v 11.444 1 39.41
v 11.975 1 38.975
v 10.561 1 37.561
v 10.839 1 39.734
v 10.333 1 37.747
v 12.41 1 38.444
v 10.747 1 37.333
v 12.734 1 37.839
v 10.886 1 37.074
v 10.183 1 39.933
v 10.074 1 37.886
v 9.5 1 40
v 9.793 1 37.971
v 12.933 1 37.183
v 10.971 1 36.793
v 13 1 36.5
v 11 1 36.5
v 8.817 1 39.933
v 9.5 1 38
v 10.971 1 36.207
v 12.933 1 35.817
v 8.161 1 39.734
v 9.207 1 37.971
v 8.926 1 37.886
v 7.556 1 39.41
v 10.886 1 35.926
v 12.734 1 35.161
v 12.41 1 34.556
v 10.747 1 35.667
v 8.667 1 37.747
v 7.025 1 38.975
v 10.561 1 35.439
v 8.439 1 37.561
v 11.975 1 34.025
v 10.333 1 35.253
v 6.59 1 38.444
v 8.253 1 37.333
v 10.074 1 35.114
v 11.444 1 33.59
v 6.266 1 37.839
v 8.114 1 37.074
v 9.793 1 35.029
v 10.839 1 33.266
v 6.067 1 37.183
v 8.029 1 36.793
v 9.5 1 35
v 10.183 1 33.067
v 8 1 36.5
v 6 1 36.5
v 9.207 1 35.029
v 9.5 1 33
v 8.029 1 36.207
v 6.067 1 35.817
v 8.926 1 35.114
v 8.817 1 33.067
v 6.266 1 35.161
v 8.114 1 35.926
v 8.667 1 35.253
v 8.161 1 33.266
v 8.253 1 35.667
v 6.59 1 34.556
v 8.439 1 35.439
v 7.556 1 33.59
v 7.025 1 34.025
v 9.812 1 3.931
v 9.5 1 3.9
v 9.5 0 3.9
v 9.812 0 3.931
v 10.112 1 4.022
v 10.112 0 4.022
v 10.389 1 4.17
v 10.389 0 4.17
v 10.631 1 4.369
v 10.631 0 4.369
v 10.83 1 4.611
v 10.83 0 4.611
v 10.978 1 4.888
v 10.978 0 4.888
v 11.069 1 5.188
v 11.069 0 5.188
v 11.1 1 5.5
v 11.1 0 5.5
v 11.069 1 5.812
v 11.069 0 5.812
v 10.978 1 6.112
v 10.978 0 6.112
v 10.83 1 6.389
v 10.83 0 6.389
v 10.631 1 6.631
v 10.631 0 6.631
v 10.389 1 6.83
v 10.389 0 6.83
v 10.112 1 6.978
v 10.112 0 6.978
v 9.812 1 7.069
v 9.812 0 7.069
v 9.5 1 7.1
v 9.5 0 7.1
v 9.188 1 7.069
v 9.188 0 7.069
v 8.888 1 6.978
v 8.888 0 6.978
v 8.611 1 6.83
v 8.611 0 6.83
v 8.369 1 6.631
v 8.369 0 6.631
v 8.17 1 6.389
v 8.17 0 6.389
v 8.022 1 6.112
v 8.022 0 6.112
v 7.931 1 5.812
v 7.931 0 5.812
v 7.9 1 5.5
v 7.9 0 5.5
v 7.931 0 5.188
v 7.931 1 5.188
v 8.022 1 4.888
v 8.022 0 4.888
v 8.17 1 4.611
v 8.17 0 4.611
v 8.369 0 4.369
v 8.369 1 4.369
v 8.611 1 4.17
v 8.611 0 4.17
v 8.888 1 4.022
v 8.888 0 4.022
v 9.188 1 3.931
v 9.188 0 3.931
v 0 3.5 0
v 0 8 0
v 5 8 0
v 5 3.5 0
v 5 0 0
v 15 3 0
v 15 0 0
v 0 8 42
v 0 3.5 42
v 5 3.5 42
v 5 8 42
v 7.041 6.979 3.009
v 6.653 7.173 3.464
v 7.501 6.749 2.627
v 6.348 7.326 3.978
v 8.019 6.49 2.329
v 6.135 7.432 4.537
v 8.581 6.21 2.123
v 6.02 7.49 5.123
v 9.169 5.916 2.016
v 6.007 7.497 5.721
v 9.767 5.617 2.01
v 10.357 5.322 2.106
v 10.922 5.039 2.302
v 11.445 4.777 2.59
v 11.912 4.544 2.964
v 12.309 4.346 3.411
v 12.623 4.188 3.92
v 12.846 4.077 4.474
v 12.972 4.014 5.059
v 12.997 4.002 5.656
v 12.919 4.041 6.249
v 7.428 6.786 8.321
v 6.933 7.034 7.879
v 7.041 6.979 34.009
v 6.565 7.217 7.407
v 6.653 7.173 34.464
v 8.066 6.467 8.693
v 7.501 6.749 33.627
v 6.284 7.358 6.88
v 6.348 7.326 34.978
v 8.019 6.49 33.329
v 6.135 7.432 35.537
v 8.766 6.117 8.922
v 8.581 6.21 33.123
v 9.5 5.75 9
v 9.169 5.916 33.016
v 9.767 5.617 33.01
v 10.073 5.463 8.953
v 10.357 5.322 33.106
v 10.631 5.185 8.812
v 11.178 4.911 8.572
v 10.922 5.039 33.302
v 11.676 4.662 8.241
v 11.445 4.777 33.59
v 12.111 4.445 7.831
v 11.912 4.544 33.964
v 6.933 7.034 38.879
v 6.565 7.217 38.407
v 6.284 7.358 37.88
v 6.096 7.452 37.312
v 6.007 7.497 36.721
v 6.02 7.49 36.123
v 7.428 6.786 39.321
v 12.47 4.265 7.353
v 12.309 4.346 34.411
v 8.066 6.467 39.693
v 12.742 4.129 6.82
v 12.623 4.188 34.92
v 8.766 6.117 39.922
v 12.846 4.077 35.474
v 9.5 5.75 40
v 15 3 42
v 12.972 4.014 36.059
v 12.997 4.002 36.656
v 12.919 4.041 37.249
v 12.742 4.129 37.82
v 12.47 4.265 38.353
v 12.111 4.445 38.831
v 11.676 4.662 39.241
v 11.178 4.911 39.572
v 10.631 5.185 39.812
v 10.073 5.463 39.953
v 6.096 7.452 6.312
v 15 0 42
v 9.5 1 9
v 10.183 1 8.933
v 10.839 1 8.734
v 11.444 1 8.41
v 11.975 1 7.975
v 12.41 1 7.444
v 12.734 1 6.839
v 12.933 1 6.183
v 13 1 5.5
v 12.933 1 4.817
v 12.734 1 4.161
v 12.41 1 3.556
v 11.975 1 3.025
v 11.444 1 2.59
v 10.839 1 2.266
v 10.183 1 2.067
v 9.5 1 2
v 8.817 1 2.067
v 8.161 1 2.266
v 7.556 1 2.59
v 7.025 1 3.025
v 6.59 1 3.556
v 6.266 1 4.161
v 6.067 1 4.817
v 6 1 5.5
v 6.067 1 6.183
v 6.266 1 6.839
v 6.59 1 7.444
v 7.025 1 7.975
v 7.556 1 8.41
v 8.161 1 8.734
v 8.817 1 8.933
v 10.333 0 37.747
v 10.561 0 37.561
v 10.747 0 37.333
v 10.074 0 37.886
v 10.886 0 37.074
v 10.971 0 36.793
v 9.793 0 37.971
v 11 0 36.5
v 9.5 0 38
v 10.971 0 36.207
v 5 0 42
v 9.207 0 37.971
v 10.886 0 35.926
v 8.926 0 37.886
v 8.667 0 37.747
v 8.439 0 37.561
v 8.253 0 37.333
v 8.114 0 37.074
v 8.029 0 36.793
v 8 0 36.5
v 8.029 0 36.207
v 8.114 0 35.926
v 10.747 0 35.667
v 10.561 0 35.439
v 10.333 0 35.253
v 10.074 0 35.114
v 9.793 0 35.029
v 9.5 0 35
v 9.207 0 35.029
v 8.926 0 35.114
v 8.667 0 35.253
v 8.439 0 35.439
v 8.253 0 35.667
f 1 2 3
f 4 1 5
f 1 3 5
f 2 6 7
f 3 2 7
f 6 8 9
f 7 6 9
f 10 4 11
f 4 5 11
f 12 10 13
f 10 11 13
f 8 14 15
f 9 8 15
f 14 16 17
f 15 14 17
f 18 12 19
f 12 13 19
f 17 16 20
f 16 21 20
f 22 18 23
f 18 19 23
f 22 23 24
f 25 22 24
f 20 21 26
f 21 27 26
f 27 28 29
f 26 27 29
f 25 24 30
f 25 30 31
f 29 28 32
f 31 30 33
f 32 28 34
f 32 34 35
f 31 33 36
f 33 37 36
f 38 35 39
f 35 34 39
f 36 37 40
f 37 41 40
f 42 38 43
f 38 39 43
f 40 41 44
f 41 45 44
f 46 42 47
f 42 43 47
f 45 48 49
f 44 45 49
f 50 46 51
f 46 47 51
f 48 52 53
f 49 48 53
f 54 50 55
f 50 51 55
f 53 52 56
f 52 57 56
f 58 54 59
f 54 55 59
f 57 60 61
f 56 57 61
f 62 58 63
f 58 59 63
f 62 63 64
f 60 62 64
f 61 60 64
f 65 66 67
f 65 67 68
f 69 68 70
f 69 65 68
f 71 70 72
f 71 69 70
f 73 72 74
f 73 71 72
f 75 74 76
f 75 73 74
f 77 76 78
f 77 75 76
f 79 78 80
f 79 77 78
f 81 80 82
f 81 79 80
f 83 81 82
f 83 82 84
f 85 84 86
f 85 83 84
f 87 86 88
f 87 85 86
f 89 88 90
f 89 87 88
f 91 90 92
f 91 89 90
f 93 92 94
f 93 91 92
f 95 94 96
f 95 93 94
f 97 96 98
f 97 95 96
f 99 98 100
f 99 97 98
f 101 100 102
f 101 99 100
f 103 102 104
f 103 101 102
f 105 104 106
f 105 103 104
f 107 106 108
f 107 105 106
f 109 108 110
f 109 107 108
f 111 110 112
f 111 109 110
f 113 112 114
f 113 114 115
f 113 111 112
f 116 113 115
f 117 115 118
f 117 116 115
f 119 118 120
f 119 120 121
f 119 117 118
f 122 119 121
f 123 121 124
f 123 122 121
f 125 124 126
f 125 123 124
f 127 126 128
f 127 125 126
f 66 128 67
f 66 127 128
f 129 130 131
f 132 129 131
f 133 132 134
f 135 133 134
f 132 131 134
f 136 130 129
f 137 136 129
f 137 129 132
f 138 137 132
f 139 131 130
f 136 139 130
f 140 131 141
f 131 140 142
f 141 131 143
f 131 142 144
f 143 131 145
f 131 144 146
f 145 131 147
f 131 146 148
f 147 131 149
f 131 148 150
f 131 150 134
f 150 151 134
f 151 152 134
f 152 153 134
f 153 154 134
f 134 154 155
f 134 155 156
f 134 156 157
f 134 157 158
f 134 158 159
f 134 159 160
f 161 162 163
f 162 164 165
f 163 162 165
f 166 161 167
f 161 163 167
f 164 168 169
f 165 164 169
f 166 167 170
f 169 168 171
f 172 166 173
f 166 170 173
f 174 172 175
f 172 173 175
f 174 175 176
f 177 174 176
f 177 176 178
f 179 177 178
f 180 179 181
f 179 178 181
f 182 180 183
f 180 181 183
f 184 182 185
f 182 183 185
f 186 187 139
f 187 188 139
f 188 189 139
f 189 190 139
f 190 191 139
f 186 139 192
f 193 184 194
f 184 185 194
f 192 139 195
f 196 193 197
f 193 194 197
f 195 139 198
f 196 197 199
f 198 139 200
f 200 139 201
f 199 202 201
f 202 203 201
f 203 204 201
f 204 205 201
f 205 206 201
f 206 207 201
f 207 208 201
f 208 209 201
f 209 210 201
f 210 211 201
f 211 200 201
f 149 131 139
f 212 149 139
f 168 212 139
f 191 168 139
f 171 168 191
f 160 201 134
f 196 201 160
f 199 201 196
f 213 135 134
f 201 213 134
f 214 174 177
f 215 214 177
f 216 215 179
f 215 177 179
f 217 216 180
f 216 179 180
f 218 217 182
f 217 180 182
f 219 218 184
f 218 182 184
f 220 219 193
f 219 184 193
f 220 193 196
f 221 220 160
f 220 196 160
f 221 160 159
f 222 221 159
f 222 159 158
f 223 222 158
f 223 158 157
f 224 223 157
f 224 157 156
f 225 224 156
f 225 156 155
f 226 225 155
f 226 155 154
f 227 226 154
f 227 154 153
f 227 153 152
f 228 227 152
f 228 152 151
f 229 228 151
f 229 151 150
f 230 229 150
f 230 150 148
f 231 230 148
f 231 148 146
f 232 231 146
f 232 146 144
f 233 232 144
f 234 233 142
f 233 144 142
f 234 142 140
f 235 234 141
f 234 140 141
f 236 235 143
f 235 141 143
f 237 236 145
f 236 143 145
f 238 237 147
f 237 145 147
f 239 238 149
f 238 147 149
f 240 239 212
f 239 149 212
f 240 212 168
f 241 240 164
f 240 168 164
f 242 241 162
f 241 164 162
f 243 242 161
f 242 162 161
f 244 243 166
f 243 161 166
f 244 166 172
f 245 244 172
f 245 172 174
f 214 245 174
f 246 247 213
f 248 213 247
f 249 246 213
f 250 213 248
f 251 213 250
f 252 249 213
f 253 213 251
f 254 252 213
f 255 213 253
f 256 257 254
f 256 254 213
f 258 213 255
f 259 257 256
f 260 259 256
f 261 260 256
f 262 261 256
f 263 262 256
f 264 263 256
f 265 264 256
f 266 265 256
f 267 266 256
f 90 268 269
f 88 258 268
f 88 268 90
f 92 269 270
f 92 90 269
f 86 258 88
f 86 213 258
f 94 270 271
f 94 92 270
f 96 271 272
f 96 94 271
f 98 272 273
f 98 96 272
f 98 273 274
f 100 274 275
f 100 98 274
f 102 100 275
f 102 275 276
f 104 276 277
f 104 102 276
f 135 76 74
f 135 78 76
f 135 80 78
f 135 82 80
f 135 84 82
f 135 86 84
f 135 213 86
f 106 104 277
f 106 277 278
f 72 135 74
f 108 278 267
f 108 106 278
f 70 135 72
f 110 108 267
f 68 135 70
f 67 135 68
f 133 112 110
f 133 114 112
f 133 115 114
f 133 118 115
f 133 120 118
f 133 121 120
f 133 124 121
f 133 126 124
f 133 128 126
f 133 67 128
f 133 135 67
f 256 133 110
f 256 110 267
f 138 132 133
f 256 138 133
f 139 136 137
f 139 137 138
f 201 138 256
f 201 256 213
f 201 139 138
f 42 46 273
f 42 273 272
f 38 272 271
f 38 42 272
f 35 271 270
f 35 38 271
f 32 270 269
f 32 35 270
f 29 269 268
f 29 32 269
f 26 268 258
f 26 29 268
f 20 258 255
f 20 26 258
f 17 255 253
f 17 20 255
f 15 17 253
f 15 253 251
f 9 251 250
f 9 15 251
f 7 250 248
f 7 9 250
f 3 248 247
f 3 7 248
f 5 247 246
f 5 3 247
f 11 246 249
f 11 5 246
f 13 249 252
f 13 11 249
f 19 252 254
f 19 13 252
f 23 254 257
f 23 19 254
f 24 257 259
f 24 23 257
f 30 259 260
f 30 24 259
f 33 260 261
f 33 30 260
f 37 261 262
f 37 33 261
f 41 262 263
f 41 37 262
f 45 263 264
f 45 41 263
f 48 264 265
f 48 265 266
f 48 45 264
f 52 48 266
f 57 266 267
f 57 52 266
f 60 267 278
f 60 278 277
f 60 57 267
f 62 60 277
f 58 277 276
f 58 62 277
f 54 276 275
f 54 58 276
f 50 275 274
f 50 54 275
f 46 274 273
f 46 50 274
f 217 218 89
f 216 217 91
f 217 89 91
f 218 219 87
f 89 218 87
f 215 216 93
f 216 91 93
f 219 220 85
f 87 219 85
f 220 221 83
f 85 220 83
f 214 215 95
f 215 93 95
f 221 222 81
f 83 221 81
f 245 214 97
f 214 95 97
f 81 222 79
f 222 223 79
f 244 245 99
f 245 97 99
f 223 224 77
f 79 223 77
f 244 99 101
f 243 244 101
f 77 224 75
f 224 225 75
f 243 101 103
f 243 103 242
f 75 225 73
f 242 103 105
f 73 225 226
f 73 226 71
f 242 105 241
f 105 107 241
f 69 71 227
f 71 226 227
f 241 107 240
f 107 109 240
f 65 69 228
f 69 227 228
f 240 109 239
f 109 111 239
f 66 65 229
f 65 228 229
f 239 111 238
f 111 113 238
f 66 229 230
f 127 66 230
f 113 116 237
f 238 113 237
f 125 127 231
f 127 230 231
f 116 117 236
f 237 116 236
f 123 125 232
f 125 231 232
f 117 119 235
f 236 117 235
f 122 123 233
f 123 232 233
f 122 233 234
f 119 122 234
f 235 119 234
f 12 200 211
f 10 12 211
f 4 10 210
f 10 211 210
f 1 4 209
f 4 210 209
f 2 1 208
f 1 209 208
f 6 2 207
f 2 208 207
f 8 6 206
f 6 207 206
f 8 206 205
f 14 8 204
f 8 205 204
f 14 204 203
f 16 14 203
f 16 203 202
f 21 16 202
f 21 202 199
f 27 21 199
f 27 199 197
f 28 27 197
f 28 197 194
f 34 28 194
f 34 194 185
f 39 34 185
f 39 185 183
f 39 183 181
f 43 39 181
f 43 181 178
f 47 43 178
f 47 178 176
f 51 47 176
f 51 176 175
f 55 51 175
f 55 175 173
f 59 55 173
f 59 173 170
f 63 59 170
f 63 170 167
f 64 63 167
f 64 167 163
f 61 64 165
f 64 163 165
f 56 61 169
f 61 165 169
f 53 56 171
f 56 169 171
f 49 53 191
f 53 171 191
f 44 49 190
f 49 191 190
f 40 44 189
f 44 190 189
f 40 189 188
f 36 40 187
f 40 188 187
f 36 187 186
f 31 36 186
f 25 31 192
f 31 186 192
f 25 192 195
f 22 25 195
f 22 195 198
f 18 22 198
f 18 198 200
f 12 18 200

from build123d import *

# Parameters (mm, degrees)
BOSS_EXTRU_1_DEPTH      = 42
ESQUISSE2_R             = 2.5
ENL_V_MAT_EXTRU_1_DEPTH = 42
ESQUISSE4_R             = 3.5
ENL_V_MAT_EXTRU_2_DEPTH = 8.5
ENL_V_MAT_EXTRU_4_DEPTH = 47
BOSS_EXTRU_2_START      = -1
ESQUISSE6_R             = 3.5
ESQUISSE6_R_2           = 1.5
ESQUISSE6_R_3           = 1.6
BOSS_EXTRU_2_DEPTH      = 1


with BuildPart() as part:
    # Esquisse1 → Boss.-Extru.1 (new body)
    with BuildSketch(Plane.XY):
        Polygon((0, 3.5), (5, 3.5), (5, 0), (15, 0), (15, 8), (0, 8), align=None)
    extrude(amount=BOSS_EXTRU_1_DEPTH)

    # Esquisse2 → Enlèv. mat.-Extru.1 (cut)
    with BuildSketch(Plane(origin=(0, 8, 0), x_dir=(1, 0, 0), z_dir=(0, 1, 0))):
        with Locations(Location((9.5, -5.5, 0), (0, 0, 270))):
            Circle(ESQUISSE2_R)
        with Locations(Location((9.5, -36.5, 0), (0, 0, 270))):
            Circle(ESQUISSE2_R)
    extrude(amount=-ENL_V_MAT_EXTRU_1_DEPTH, mode=Mode.SUBTRACT)

    # Esquisse4 → Enlèv. mat.-Extru.2 (cut)
    with BuildSketch(Plane(origin=(0, 8, 0), x_dir=(1, 0, 0), z_dir=(0, 1, 0))):
        with Locations(Location((9.5, -5.5, 0), (0, 0, 270))):
            Circle(ESQUISSE4_R)
        with Locations(Location((9.5, -36.5, 0), (0, 0, 270))):
            Circle(ESQUISSE4_R)
    extrude(amount=-ENL_V_MAT_EXTRU_2_DEPTH, mode=Mode.SUBTRACT)

    # Esquisse5 → Enlèv. mat.-Extru.4 (cut)
    with BuildSketch(Plane.XY.offset(42)):
        Polygon((5, 8), (15, 3), (18.054100071, 8.962914679), (5.626380762, 14.083983342), align=None)
    extrude(amount=-ENL_V_MAT_EXTRU_4_DEPTH, mode=Mode.SUBTRACT)

    # Esquisse6 → Boss.-Extru.2 (add)
    # profile 1 of 2: a face of its own
    with BuildSketch(Plane(origin=(0, 0, 0), x_dir=(-1, 0, 0), z_dir=(0, -1, 0)).offset(BOSS_EXTRU_2_START)):
        with Locations((-9.5, -36.5)):
            Circle(ESQUISSE6_R)
        with Locations(Location((-9.5, -36.5, 0), (0, 0, 90))):
            Circle(ESQUISSE6_R_2, mode=Mode.SUBTRACT)
    # profile 2 of 2: a face of its own
    with BuildSketch(Plane(origin=(0, 0, 0), x_dir=(-1, 0, 0), z_dir=(0, -1, 0)).offset(BOSS_EXTRU_2_START)):
        with Locations((-9.5, -5.5)):
            Circle(ESQUISSE6_R)
        with Locations(Location((-9.5, -5.5, 0), (0, 0, 90))):
            Circle(ESQUISSE6_R_3, mode=Mode.SUBTRACT)
    extrude(amount=BOSS_EXTRU_2_DEPTH)


solid = part.part
